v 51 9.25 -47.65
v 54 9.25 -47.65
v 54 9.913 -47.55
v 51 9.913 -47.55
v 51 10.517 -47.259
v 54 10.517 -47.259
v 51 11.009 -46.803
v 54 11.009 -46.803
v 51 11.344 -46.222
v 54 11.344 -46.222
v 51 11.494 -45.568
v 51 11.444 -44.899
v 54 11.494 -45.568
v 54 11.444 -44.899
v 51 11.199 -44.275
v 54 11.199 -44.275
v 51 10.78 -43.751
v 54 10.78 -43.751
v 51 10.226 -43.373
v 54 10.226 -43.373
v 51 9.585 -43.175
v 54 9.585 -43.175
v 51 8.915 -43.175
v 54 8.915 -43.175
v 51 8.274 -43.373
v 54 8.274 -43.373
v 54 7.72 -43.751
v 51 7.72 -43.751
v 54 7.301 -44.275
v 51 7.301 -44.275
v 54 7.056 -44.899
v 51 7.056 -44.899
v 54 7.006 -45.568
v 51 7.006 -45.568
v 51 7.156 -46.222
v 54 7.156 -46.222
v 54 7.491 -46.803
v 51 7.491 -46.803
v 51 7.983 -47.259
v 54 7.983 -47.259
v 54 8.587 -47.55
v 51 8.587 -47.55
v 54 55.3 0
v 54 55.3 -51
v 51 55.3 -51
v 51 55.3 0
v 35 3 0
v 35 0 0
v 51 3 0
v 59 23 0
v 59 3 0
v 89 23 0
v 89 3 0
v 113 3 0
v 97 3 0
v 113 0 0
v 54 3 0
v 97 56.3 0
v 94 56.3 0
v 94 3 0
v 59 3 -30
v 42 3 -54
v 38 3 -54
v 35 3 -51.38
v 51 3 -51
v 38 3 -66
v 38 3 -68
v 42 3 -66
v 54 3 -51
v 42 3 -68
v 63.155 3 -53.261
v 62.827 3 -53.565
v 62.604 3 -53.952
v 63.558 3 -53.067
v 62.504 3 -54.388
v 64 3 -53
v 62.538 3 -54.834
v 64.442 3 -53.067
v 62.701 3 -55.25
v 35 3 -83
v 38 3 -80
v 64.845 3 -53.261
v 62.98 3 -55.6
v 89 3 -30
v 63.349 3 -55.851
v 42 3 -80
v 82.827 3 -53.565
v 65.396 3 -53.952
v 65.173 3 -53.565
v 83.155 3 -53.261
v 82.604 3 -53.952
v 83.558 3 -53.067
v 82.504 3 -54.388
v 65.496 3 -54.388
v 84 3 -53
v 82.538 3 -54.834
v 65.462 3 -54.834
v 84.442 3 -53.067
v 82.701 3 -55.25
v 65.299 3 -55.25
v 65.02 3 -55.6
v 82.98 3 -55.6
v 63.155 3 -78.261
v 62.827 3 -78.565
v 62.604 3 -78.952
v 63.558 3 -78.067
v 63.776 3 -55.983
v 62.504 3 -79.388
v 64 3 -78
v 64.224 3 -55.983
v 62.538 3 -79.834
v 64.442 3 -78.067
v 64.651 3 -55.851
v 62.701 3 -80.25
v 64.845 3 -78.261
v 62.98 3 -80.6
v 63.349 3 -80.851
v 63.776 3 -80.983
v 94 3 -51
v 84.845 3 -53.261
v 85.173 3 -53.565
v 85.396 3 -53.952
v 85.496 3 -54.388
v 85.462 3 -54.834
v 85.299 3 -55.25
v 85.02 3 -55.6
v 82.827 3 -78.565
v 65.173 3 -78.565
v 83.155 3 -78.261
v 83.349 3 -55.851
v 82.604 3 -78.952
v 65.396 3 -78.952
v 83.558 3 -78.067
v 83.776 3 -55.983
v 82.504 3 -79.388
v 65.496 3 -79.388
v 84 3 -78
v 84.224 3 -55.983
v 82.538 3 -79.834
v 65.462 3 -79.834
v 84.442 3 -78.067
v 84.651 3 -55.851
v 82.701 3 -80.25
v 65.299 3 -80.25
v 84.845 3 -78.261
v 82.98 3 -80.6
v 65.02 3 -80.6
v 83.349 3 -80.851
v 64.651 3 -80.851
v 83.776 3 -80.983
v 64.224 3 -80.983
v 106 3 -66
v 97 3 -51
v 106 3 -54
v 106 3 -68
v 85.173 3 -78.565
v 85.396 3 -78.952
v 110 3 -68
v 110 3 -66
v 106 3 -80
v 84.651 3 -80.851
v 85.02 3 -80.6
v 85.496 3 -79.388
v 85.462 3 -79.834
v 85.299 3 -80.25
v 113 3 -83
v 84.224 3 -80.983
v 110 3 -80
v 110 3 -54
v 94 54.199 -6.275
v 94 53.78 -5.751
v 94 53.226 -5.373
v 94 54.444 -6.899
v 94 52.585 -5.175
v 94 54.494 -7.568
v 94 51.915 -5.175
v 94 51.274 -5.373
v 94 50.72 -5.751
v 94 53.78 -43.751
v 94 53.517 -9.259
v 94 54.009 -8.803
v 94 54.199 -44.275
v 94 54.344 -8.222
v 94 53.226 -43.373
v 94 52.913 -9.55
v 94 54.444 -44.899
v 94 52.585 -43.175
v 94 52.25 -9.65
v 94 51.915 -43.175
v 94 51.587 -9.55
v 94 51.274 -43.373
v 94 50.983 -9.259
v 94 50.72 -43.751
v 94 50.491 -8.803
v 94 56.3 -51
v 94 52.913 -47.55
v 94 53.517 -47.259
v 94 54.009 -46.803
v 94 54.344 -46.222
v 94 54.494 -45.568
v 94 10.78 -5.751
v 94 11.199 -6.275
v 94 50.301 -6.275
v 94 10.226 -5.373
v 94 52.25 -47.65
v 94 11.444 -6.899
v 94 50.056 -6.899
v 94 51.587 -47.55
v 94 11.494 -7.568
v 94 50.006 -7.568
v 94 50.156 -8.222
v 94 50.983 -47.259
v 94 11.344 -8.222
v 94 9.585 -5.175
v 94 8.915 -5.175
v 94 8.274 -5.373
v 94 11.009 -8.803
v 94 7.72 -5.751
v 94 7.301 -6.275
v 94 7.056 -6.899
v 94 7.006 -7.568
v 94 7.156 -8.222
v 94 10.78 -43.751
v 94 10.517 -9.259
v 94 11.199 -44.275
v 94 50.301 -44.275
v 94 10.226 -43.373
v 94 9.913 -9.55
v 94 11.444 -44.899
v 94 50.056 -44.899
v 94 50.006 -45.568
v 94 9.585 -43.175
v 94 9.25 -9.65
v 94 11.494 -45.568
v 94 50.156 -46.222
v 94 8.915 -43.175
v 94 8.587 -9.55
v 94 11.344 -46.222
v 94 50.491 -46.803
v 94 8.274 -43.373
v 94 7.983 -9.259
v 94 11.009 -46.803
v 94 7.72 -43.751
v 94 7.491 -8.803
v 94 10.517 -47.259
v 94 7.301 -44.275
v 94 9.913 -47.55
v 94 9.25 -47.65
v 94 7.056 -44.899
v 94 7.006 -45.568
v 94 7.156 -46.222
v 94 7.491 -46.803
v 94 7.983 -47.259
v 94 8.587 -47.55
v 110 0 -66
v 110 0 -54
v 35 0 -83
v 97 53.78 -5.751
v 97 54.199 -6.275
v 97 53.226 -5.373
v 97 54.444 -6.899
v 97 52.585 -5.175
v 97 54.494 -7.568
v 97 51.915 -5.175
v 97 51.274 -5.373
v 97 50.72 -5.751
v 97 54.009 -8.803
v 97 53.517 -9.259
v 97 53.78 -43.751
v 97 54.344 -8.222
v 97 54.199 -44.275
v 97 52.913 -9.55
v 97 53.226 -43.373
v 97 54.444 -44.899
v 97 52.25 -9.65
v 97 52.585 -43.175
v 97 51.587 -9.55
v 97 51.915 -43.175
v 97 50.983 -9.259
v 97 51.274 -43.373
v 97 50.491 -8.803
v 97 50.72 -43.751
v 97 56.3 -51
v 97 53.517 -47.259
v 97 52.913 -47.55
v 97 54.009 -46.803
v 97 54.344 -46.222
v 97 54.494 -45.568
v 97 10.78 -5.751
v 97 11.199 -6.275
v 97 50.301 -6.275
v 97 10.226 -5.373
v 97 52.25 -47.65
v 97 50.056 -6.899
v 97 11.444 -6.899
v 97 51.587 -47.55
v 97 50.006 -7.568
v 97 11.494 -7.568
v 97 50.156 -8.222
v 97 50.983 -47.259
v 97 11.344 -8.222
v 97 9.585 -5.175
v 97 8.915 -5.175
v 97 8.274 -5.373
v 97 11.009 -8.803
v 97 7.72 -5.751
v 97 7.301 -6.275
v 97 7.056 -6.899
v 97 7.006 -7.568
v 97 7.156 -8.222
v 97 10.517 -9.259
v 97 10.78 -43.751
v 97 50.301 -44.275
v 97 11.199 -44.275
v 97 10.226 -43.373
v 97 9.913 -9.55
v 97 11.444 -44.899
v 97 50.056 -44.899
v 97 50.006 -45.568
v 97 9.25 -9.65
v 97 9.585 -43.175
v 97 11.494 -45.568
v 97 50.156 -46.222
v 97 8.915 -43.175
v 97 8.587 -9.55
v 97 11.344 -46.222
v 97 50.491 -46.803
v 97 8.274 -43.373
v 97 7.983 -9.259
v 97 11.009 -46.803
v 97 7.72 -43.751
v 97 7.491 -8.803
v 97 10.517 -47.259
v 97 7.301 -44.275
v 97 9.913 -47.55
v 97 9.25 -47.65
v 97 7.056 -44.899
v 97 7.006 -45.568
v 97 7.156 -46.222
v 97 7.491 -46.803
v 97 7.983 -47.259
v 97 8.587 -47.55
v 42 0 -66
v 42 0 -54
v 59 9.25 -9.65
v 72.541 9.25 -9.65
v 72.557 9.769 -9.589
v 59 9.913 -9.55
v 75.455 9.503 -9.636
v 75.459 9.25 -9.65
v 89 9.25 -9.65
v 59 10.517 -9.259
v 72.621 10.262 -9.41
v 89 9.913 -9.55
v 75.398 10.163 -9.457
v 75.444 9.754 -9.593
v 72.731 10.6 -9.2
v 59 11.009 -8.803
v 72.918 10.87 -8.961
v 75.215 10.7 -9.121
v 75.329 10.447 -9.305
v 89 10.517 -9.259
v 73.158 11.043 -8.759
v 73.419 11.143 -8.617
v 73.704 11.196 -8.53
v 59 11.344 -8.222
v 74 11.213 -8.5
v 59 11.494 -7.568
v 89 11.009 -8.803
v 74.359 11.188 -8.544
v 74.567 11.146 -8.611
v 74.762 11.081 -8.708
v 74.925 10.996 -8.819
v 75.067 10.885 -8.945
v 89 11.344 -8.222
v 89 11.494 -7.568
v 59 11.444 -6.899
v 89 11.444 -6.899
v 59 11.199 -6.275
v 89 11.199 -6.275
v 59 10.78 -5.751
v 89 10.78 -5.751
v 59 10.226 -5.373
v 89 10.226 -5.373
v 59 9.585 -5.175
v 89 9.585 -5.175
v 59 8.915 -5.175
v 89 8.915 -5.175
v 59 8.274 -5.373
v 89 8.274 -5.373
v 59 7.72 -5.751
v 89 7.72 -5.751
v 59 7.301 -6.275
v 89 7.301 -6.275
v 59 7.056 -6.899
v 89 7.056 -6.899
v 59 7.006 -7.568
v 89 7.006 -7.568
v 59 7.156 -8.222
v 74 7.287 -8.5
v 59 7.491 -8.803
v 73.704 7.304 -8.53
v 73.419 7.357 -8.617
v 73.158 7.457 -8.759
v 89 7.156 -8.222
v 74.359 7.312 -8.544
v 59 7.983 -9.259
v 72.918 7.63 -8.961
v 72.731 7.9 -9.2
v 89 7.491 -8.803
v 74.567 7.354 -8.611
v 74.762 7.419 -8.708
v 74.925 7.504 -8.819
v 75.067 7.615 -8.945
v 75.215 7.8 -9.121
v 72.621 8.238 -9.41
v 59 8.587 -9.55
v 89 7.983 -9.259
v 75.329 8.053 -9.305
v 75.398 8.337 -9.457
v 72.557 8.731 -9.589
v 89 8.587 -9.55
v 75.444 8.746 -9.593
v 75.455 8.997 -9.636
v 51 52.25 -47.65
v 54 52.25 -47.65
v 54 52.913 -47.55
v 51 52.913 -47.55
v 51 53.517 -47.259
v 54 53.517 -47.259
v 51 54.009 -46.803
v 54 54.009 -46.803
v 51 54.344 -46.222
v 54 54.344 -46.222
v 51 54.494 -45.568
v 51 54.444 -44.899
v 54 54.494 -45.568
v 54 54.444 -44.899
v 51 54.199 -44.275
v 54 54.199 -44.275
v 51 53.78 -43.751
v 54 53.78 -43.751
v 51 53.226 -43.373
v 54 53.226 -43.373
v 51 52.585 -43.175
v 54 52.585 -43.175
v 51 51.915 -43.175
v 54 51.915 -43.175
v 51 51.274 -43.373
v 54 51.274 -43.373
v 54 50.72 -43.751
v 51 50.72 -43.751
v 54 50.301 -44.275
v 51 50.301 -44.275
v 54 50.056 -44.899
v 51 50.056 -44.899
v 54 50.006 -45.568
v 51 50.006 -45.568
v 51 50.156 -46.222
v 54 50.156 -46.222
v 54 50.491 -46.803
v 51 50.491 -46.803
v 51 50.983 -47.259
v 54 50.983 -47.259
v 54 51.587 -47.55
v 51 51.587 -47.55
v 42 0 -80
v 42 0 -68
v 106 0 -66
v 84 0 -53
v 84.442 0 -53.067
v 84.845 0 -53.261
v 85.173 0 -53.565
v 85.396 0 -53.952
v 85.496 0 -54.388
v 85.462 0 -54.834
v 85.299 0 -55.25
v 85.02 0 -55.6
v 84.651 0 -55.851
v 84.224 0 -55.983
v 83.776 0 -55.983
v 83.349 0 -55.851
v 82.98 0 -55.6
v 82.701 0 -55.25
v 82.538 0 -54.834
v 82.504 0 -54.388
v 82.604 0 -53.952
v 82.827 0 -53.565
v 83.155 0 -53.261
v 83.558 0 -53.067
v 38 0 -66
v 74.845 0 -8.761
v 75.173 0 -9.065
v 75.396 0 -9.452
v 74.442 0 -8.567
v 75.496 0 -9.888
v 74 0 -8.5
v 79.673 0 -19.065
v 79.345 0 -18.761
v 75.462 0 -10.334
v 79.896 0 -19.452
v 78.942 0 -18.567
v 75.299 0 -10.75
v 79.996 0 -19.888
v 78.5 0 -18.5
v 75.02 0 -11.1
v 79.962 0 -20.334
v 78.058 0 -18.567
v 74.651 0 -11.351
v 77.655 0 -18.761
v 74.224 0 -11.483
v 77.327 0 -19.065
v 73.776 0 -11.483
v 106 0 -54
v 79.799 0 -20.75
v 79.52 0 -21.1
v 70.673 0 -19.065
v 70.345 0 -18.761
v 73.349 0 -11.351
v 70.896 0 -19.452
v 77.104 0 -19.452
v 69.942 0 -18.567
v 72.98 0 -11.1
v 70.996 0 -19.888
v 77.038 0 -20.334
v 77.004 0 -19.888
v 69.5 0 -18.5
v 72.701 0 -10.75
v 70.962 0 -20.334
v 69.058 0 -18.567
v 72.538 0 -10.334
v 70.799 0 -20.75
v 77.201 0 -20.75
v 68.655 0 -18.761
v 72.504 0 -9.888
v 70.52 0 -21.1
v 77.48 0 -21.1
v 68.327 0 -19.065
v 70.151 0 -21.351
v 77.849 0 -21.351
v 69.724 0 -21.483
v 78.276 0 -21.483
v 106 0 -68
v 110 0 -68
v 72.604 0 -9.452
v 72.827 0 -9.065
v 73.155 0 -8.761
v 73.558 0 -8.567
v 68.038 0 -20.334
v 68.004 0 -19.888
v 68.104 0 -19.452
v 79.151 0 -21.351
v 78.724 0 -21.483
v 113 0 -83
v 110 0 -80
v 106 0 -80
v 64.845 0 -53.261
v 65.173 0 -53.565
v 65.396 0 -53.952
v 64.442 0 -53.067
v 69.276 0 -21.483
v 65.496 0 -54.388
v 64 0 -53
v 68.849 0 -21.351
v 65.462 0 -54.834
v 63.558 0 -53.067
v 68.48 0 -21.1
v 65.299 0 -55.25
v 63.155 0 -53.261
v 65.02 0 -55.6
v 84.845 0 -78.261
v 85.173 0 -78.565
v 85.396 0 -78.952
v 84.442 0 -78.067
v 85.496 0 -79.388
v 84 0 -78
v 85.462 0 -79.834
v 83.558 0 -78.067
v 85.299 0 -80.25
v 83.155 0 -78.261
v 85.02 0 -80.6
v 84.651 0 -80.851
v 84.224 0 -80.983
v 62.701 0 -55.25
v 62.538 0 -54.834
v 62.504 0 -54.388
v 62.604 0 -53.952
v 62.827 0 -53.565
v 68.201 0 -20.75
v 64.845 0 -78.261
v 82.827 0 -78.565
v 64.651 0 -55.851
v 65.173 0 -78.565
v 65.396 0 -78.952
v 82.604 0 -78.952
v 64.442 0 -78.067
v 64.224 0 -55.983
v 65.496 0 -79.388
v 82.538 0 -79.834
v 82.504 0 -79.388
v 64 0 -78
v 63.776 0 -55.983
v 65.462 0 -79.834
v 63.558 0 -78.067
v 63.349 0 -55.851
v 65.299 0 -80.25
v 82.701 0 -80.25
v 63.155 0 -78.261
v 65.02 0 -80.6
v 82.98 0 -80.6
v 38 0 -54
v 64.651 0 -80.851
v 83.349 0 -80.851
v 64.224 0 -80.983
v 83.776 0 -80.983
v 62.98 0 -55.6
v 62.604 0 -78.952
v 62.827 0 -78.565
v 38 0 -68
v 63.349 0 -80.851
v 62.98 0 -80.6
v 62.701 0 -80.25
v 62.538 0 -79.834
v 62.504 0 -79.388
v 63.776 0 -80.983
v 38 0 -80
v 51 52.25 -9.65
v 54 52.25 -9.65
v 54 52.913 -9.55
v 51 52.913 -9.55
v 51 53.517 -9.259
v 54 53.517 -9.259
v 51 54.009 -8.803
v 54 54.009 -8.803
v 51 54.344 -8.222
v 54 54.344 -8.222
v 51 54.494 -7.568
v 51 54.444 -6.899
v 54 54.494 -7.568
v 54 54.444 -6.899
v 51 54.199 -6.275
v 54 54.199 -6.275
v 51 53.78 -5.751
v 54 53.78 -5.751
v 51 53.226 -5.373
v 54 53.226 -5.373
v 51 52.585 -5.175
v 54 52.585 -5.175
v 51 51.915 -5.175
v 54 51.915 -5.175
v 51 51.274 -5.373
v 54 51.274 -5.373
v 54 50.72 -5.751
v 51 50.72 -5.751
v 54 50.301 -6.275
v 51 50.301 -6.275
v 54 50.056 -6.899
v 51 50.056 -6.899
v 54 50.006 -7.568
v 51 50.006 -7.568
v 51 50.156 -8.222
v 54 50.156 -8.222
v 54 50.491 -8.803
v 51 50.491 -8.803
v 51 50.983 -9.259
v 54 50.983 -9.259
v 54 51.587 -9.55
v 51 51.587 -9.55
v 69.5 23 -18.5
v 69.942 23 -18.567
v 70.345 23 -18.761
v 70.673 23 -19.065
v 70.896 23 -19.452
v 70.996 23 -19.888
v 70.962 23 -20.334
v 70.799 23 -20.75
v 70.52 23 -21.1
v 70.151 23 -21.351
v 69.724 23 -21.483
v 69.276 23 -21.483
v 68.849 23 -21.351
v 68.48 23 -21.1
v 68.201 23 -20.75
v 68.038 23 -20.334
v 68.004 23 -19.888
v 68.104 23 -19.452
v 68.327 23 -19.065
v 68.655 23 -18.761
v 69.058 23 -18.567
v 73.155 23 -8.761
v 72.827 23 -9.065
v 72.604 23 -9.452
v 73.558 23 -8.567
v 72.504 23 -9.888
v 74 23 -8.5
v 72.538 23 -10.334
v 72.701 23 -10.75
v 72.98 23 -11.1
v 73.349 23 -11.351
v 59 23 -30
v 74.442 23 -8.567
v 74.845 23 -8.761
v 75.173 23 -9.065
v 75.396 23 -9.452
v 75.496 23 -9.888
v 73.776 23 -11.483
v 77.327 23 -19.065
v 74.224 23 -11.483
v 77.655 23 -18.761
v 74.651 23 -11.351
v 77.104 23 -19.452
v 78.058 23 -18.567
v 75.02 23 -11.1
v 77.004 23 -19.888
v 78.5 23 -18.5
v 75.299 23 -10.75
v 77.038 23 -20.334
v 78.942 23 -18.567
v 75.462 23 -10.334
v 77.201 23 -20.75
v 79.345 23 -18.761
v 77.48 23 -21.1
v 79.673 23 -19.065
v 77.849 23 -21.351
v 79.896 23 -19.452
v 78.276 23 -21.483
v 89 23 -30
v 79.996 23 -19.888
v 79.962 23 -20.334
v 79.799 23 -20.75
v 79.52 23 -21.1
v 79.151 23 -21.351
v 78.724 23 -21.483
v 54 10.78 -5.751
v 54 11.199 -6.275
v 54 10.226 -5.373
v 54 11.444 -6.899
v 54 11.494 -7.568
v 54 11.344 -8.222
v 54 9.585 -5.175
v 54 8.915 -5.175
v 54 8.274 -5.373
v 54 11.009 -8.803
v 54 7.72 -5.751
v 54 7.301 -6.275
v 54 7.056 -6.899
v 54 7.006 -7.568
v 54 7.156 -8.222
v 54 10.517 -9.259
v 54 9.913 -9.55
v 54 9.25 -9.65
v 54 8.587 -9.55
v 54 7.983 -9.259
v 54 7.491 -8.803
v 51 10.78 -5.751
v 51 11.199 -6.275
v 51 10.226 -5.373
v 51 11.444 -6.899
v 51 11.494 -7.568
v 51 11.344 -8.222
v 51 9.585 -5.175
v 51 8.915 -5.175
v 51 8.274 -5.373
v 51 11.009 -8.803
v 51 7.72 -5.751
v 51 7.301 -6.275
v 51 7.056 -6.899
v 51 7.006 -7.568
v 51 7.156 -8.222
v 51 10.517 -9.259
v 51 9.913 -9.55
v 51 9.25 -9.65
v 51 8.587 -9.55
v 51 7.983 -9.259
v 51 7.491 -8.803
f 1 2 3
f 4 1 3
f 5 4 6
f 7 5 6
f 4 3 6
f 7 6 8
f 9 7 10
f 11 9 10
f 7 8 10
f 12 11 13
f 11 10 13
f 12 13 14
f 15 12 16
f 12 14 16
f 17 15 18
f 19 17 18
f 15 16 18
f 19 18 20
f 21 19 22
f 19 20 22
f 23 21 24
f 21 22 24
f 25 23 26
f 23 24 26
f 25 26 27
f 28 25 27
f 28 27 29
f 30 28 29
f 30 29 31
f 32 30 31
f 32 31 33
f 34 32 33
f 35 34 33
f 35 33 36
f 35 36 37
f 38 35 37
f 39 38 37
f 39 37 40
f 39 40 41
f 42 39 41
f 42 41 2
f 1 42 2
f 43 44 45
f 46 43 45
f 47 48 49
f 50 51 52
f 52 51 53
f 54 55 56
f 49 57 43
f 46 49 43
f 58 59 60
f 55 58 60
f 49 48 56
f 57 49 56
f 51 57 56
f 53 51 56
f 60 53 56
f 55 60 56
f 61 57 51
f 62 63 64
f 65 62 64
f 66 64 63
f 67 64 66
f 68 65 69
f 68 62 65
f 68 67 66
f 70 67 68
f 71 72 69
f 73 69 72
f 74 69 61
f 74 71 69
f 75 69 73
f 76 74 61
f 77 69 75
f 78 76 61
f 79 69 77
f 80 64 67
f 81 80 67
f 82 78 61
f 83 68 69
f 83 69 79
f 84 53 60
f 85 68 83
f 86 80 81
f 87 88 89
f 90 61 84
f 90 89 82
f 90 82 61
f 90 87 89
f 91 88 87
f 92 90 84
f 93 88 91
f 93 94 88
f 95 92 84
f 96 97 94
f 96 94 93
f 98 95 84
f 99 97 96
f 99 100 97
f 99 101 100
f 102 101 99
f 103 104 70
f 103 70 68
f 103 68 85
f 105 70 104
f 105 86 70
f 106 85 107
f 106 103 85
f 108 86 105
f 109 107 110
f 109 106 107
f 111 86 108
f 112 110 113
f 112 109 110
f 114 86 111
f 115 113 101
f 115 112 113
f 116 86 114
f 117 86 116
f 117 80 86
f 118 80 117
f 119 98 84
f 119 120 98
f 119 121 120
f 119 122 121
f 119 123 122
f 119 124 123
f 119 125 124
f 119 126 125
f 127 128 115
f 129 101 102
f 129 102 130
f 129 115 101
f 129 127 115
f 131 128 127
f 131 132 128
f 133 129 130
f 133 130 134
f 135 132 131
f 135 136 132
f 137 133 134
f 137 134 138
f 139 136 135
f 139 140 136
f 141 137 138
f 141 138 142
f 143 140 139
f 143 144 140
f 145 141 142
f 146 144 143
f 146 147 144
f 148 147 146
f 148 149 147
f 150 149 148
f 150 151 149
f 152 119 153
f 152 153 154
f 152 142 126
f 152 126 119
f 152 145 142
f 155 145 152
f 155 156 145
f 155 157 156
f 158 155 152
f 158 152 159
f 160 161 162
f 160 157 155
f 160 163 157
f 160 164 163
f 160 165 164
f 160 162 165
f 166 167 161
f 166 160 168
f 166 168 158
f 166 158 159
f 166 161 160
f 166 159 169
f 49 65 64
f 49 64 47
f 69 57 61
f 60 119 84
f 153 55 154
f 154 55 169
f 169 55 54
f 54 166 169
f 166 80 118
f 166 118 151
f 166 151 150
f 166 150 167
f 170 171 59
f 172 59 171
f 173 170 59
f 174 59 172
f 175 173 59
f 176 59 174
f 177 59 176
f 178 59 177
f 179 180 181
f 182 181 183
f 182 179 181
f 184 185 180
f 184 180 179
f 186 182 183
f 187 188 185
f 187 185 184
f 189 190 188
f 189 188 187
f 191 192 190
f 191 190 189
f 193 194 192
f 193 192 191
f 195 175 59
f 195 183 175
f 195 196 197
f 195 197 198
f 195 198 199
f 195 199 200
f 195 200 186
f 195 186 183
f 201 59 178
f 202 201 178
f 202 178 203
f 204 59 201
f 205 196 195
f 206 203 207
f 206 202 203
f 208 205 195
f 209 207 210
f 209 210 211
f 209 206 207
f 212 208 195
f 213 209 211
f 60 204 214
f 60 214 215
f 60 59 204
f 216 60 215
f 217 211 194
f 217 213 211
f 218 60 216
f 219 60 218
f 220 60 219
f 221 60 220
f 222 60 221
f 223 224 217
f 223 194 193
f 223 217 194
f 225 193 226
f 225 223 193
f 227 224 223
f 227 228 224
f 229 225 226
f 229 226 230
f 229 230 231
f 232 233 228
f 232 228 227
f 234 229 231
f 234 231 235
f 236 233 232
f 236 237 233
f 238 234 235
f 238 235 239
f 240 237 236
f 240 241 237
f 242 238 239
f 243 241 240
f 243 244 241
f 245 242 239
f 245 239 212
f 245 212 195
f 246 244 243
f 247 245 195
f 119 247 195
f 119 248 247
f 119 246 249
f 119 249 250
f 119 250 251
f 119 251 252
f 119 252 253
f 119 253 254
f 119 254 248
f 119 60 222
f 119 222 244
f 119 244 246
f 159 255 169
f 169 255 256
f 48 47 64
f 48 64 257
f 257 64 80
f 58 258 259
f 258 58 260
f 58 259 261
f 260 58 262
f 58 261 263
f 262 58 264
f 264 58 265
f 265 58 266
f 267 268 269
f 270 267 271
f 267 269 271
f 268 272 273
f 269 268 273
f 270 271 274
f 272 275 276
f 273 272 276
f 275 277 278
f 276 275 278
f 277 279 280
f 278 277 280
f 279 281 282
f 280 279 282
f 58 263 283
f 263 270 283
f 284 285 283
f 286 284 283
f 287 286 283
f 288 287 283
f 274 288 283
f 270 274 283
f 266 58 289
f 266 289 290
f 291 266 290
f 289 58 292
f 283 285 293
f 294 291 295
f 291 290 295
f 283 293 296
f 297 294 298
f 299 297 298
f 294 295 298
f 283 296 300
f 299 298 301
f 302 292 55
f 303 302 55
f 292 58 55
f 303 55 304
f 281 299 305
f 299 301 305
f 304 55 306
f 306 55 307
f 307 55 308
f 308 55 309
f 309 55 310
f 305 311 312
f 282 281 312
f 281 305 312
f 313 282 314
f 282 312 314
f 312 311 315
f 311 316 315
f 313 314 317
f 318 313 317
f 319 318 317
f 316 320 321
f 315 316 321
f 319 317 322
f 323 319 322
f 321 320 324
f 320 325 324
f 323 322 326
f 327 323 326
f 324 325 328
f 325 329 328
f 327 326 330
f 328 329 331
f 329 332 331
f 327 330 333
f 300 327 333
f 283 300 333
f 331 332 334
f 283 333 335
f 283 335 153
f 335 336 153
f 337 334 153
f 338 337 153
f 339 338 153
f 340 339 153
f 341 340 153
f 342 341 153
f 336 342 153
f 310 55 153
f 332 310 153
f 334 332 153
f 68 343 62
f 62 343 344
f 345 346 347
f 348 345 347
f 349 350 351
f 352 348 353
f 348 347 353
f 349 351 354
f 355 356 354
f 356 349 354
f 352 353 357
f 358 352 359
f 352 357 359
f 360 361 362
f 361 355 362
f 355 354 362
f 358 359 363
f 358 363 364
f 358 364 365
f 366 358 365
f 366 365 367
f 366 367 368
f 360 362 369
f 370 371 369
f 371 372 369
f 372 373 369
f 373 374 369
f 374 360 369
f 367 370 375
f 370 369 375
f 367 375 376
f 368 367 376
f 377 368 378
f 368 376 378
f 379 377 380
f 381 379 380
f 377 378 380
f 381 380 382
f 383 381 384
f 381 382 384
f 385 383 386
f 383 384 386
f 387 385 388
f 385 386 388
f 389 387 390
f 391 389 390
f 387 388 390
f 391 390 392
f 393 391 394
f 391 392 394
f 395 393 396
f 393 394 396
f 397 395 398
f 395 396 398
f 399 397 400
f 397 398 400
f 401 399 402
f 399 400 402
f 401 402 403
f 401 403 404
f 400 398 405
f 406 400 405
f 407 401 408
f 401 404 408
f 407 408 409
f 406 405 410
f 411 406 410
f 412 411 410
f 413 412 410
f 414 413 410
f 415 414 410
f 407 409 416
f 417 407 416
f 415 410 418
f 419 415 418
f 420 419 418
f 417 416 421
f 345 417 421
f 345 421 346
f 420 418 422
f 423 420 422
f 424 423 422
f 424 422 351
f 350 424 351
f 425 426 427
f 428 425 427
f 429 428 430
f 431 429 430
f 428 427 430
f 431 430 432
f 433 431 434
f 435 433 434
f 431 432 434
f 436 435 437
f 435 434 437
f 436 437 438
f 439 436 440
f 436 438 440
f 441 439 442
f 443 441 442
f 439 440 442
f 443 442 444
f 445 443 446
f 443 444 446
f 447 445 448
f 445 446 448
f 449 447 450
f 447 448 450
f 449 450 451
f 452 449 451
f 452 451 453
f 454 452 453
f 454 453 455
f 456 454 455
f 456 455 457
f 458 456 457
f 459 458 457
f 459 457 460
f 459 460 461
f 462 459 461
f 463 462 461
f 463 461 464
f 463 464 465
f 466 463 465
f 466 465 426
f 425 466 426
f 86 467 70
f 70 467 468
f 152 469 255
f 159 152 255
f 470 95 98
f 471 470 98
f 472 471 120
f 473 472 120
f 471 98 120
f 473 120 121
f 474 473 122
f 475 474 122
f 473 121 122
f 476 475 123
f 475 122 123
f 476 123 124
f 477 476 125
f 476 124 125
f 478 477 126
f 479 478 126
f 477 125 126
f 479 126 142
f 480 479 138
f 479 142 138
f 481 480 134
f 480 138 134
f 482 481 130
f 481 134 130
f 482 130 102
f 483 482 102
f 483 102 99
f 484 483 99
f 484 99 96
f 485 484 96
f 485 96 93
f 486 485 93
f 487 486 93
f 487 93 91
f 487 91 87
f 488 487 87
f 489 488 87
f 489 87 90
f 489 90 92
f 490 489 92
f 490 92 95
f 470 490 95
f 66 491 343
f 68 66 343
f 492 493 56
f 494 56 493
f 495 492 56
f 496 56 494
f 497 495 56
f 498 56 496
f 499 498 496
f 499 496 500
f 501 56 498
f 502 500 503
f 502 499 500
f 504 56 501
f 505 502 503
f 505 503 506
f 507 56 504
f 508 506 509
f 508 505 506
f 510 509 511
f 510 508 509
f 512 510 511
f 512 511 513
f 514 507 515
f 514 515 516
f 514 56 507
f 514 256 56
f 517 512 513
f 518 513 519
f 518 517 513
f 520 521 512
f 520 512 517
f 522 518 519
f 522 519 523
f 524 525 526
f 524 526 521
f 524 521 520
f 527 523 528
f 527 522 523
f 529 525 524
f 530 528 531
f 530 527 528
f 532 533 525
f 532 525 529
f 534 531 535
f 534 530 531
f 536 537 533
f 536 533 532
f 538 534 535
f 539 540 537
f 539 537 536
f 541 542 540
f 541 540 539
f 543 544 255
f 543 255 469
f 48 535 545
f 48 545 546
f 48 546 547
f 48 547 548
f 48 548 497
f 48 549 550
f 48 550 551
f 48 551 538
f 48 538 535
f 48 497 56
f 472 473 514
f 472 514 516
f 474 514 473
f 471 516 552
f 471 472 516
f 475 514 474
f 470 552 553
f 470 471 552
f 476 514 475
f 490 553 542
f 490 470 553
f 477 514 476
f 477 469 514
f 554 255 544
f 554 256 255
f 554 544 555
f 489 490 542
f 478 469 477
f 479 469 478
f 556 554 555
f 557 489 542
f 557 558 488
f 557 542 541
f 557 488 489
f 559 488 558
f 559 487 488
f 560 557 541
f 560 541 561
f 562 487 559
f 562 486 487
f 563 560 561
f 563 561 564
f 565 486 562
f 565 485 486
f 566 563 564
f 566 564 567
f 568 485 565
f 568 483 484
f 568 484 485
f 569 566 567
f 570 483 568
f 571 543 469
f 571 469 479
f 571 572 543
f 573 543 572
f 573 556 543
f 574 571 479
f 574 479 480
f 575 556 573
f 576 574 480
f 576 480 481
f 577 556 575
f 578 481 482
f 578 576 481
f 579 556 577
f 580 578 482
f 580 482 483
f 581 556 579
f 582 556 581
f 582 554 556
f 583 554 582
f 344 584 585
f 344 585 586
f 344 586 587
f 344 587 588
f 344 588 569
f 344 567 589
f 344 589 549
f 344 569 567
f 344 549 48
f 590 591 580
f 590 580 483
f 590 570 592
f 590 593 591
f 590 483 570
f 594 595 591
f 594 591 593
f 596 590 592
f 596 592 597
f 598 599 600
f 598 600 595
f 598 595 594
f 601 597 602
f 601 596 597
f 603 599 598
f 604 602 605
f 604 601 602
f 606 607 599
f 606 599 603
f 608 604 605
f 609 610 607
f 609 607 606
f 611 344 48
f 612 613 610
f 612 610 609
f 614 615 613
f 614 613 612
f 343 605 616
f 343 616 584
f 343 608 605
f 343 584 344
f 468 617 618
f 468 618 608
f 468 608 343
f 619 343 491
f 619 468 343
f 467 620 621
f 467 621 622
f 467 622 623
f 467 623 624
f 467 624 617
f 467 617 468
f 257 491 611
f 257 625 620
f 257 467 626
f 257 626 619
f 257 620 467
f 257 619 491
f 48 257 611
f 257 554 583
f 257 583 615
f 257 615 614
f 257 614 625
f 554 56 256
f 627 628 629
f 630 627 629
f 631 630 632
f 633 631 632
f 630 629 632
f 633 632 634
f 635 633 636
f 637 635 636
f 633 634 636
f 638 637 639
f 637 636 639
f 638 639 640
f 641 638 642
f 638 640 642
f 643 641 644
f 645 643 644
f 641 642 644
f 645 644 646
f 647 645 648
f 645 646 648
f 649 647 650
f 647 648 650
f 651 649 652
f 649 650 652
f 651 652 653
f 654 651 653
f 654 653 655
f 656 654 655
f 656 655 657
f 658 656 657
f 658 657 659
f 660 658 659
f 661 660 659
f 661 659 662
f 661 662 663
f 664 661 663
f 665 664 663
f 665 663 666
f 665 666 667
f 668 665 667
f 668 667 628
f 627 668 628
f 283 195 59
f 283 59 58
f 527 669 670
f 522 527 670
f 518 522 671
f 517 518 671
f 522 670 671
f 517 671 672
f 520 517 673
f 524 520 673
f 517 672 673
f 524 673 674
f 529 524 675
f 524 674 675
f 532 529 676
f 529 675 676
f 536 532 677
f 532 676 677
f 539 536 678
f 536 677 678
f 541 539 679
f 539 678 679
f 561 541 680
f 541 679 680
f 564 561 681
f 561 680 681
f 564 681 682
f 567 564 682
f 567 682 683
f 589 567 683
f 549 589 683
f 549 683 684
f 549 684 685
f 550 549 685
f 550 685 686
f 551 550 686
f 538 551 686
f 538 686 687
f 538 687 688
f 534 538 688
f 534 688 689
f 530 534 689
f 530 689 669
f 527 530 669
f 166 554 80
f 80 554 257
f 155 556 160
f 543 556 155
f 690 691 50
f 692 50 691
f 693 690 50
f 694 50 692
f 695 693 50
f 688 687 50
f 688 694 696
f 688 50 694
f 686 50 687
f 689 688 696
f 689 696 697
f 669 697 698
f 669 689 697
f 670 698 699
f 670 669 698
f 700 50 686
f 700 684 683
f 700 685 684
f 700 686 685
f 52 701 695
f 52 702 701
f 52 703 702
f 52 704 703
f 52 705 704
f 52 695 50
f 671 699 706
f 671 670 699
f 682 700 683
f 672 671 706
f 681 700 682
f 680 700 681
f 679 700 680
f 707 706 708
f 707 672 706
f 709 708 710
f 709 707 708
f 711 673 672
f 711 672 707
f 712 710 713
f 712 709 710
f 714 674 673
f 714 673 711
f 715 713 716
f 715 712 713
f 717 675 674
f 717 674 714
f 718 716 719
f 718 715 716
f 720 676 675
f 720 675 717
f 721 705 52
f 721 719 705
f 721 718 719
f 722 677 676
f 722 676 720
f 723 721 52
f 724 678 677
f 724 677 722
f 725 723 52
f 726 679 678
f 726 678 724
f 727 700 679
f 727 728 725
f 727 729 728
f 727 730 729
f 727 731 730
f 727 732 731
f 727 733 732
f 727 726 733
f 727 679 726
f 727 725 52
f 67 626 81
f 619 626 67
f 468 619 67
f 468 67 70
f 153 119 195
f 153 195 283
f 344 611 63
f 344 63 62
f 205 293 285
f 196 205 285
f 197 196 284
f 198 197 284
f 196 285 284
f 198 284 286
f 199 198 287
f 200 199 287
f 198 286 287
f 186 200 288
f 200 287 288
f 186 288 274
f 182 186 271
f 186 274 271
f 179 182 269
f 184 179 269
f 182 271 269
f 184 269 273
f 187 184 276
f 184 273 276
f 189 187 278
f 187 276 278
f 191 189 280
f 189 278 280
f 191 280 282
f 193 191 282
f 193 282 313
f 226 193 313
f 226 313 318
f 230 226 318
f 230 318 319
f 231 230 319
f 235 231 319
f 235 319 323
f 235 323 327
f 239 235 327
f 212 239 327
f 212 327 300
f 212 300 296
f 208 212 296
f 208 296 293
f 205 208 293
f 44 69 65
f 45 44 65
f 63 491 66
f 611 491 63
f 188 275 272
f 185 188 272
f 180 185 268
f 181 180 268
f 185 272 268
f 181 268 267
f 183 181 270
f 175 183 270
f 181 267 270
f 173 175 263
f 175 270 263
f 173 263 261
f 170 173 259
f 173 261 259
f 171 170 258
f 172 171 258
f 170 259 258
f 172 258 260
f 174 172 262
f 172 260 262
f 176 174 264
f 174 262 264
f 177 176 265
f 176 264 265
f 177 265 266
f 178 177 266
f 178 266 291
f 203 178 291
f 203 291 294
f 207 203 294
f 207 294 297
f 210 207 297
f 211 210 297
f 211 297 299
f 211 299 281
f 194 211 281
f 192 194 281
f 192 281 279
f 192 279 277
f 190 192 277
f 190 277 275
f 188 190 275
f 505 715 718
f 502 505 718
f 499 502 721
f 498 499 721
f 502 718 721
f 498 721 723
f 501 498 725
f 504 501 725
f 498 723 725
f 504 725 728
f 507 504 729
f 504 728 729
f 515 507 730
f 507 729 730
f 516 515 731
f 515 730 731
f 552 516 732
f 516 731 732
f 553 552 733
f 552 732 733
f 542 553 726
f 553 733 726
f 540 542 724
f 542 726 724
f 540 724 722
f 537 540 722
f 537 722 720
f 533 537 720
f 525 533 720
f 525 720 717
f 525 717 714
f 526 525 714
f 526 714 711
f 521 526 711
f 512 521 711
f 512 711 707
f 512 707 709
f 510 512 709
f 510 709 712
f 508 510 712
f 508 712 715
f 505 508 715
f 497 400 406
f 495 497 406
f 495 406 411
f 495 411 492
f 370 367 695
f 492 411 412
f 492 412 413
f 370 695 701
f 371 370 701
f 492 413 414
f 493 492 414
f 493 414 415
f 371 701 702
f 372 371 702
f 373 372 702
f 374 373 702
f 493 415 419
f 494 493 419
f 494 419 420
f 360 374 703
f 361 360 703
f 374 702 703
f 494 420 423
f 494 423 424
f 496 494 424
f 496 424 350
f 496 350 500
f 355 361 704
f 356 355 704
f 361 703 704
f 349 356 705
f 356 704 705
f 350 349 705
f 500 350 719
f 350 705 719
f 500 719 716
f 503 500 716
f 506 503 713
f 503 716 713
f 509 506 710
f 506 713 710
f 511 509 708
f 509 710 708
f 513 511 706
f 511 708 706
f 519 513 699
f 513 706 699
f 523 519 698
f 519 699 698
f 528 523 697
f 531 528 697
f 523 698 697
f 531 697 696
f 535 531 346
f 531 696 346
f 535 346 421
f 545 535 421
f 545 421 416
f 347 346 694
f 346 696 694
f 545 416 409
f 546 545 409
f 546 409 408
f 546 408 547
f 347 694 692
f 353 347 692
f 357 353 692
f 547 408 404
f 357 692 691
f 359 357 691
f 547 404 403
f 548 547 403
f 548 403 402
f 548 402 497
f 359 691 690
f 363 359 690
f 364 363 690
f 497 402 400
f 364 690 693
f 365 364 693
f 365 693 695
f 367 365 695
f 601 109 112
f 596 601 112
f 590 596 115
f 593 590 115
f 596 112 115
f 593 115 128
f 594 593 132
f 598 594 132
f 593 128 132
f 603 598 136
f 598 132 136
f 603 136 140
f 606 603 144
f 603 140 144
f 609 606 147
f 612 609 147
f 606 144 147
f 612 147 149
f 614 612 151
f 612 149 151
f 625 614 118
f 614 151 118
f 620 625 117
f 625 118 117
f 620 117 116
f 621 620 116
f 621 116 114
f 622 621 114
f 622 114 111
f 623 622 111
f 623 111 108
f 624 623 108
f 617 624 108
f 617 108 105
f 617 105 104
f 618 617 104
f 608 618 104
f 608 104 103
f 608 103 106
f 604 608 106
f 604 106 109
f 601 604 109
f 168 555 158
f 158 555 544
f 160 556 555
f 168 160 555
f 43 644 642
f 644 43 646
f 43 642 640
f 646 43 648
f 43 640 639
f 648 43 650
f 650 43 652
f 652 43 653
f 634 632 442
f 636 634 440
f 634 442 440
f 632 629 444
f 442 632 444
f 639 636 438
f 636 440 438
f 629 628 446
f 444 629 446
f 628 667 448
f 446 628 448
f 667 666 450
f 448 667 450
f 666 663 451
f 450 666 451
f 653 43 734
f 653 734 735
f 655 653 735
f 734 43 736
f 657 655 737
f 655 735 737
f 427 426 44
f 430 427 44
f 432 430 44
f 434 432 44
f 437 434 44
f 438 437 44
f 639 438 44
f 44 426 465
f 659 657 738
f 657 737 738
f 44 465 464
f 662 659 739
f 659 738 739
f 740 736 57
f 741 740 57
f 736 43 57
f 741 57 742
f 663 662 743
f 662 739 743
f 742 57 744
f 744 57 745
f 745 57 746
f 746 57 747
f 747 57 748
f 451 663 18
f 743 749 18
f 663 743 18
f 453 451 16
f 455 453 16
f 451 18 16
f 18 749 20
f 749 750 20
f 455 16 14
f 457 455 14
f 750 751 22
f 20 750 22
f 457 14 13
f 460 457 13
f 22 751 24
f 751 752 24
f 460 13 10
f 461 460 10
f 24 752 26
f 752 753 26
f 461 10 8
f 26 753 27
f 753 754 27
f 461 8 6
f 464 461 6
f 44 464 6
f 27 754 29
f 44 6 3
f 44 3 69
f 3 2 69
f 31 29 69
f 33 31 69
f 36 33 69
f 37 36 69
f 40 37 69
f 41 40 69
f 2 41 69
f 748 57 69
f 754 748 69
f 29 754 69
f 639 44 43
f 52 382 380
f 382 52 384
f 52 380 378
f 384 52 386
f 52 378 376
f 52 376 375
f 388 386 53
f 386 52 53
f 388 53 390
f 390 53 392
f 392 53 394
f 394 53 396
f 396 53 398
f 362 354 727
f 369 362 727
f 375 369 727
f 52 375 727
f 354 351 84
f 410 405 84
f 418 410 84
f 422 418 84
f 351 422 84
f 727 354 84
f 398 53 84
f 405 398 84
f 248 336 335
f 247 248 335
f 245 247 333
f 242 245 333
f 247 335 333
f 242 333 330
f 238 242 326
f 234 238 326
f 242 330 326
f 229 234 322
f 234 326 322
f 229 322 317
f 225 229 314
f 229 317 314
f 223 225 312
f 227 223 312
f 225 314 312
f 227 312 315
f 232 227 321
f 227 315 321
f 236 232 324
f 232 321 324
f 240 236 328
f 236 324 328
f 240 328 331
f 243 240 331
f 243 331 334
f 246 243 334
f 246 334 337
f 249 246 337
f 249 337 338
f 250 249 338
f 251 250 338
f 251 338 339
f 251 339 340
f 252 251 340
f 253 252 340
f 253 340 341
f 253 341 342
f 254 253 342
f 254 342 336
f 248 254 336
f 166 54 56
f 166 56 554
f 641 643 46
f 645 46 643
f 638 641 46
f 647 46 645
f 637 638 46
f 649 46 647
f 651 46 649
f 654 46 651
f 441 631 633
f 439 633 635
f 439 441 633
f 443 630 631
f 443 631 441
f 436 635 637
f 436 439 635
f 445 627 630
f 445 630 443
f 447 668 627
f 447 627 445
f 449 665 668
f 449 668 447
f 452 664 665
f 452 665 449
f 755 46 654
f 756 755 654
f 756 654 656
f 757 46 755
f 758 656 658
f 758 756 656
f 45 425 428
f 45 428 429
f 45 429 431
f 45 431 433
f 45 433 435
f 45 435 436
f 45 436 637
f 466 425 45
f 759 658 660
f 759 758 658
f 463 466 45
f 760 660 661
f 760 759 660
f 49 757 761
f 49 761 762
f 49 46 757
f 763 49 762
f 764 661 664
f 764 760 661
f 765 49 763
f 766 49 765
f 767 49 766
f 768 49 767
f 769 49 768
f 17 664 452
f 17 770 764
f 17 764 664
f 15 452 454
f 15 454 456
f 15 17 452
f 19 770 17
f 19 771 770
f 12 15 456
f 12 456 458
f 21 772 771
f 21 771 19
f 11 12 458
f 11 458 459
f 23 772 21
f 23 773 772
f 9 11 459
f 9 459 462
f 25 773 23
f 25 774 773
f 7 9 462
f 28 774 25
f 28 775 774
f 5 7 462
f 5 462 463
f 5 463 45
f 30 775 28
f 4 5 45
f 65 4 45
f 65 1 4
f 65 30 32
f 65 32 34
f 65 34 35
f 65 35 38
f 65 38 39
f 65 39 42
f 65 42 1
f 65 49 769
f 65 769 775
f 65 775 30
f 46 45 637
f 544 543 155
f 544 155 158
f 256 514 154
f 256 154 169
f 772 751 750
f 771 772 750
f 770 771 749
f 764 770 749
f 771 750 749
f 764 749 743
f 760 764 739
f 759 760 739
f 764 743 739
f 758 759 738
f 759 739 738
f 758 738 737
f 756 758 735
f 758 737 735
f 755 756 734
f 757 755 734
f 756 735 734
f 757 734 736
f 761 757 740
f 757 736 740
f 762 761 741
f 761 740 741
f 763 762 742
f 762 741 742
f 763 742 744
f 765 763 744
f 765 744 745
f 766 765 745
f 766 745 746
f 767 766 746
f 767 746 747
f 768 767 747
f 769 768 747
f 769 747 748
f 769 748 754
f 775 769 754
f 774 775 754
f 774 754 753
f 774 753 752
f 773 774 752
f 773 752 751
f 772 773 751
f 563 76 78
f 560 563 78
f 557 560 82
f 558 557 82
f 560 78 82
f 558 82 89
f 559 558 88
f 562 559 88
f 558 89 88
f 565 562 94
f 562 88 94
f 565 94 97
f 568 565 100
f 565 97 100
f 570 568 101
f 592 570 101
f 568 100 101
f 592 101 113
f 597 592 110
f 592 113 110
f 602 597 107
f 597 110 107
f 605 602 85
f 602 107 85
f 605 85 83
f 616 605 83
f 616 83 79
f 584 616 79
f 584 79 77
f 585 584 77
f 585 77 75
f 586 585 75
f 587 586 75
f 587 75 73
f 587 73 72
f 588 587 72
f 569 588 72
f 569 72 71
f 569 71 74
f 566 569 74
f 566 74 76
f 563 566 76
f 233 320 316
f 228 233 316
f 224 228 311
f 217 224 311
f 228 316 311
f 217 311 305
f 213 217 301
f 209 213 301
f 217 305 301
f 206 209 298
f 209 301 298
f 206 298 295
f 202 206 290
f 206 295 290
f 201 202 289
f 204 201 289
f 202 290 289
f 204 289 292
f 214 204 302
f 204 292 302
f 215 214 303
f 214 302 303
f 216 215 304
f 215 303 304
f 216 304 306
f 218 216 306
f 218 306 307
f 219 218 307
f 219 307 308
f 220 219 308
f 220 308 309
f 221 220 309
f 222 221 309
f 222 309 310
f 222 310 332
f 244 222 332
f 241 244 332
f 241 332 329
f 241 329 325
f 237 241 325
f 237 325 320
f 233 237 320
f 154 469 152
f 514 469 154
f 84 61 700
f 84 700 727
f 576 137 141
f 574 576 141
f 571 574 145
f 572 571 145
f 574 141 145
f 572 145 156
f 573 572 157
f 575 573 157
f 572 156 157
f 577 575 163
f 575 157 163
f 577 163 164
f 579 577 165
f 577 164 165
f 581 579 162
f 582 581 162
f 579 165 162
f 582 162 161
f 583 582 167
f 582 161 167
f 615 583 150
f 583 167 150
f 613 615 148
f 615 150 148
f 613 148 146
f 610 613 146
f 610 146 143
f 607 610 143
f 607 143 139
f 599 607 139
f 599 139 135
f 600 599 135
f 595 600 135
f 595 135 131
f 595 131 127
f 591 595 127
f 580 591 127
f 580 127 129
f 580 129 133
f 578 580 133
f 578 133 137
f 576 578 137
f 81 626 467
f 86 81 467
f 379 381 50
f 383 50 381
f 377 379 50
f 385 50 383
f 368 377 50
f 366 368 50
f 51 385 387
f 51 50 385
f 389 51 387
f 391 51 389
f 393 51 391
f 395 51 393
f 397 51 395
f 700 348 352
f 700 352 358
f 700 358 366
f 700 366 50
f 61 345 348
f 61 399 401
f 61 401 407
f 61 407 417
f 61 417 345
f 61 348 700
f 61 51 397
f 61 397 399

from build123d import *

# Parameters (mm, degrees)
SKETCH1_W            = 148
SKETCH1_H            = 115
BOSS_EXTRUDE4_DEPTH  = 3
SKETCH2_R            = 2.25
CUT_EXTRUDE1_DEPTH   = 3
SKETCH3_R            = 2.25
CUT_EXTRUDE2_DEPTH   = 3
SKETCH4_R            = 2.25
CUT_EXTRUDE3_DEPTH   = 3
SKETCH5_W            = 30
SKETCH5_H            = 30
BOSS_EXTRUDE7_DEPTH  = 20
SKETCH6_R            = 2.25
CUT_EXTRUDE4_DEPTH   = 10
SKETCH7_R            = 1.5
CUT_EXTRUDE5_DEPTH   = 30
SKETCH10_W           = 20
SKETCH10_H           = 51.38
CUT_EXTRUDE6_DEPTH   = 51.3
SKETCH11_W           = 20.353734706
SKETCH11_H           = 51.38
CUT_EXTRUDE7_DEPTH   = 51.3
SKETCH13_W           = 5
SKETCH13_H           = 14
CUT_EXTRUDE8_DEPTH   = 51.3
SKETCH8_W            = 3
SKETCH8_H            = 51
BOSS_EXTRUDE11_DEPTH = 53.3
SKETCH9_W            = 3
SKETCH9_H            = 51
BOSS_EXTRUDE12_DEPTH = 55.3
SKETCH15_R           = 2.25
CUT_EXTRUDE12_DEPTH  = 53.3
SKETCH14_R           = 2.25
CUT_EXTRUDE13_DEPTH  = 53.3
SKETCH17_R           = 2.25
CUT_EXTRUDE14_DEPTH  = 53.3
SKETCH18_W           = 15
SKETCH18_H           = 51.38
CUT_EXTRUDE15_DEPTH  = 10
SKETCH19_W           = 145.001760506
SKETCH19_H           = 61.096648556
BOSS_EXTRUDE13_DEPTH = 3
SKETCH20_R           = 1.5
CUT_EXTRUDE16_DEPTH  = 43
SKETCH21_W           = 109.74816289
SKETCH21_H           = 51.975747058
CUT_EXTRUDE18_DEPTH  = 43
SKETCH23_W           = 39.73104878
SKETCH23_H           = 68.636927329
CUT_EXTRUDE19_DEPTH  = 43
SKETCH24_W           = 37.931057655
SKETCH24_H           = 65.519761518
CUT_EXTRUDE20_DEPTH  = 43
SKETCH25_W           = 4
SKETCH25_H           = 12
CUT_EXTRUDE23_DEPTH  = 43


with BuildPart() as part:
    # Sketch1 → Boss-Extrude4 (new body)
    with BuildSketch(Plane(origin=(0, 0, 0), x_dir=(1, 0, 0), z_dir=(0, 1, 0))):
        with Locations((74, 57.5)):
            Rectangle(SKETCH1_W, SKETCH1_H)
    extrude(amount=BOSS_EXTRUDE4_DEPTH)

    # Sketch2 → Cut-Extrude1 (cut)
    with BuildSketch(Plane(origin=(0, 3, 0), x_dir=(1, 0, 0), z_dir=(0, 1, 0))):
        with Locations(Location((5, 110, 0), (0, 0, 270))):
            Circle(SKETCH2_R)
    extrude(amount=-CUT_EXTRUDE1_DEPTH, mode=Mode.SUBTRACT)

    # Sketch3 → Cut-Extrude2 (cut)
    with BuildSketch(Plane(origin=(0, 3, 0), x_dir=(1, 0, 0), z_dir=(0, 1, 0))):
        with Locations(Location((143, 110, 0), (0, 0, 270))):
            Circle(SKETCH3_R)
    extrude(amount=-CUT_EXTRUDE2_DEPTH, mode=Mode.SUBTRACT)

    # Sketch4 → Cut-Extrude3 (cut)
    with BuildSketch(Plane(origin=(0, 3, 0), x_dir=(1, 0, 0), z_dir=(0, 1, 0))):
        with Locations(Location((5, 56, 0), (0, 0, 270))):
            Circle(SKETCH4_R)
    extrude(amount=-CUT_EXTRUDE3_DEPTH, mode=Mode.SUBTRACT)

    # Sketch5 → Boss-Extrude7 (add)
    with BuildSketch(Plane(origin=(0, 3, 0), x_dir=(1, 0, 0), z_dir=(0, 1, 0))):
        with Locations((74, 15)):
            Rectangle(SKETCH5_W, SKETCH5_H)
    extrude(amount=BOSS_EXTRUDE7_DEPTH)

    # Sketch6 → Cut-Extrude4 (cut)
    with BuildSketch(Plane(origin=(0, 3, 0), x_dir=(1, 0, 0), z_dir=(0, 1, 0))):
        with Locations(Location((20, 110, 0), (0, 0, 270))):
            Circle(SKETCH6_R)
        with Locations(Location((35, 110, 0), (0, 0, 270))):
            Circle(SKETCH6_R)
        with Locations(Location((20, 56, 0), (0, 0, 270))):
            Circle(SKETCH6_R)
        with Locations(Location((35, 56, 0), (0, 0, 270))):
            Circle(SKETCH6_R)
        with Locations(Location((128, 110, 0), (0, 0, 270))):
            Circle(SKETCH6_R)
        with Locations(Location((113, 110, 0), (0, 0, 270))):
            Circle(SKETCH6_R)
        with Locations(Location((113, 56, 0), (0, 0, 270))):
            Circle(SKETCH6_R)
        with Locations(Location((128, 56, 0), (0, 0, 270))):
            Circle(SKETCH6_R)
        with Locations(Location((143, 56, 0), (0, 0, 270))):
            Circle(SKETCH6_R)
    extrude(amount=-CUT_EXTRUDE4_DEPTH, mode=Mode.SUBTRACT)

    # Sketch7 → Cut-Extrude5 (cut)
    with BuildSketch(Plane(origin=(0, 23, 0), x_dir=(1, 0, 0), z_dir=(0, 1, 0))):
        with Locations(Location((69.5, 20, 0), (0, 0, 270))):
            Circle(SKETCH7_R)
        with Locations(Location((74, 10, 0), (0, 0, 270))):
            Circle(SKETCH7_R)
        with Locations(Location((78.5, 20, 0), (0, 0, 270))):
            Circle(SKETCH7_R)
    extrude(amount=-CUT_EXTRUDE5_DEPTH, mode=Mode.SUBTRACT)

    # Sketch10 → Cut-Extrude6 (cut)
    with BuildSketch(Plane(origin=(0, 3, 0), x_dir=(1, 0, 0), z_dir=(0, 1, 0))):
        with Locations((138, 25.69)):
            Rectangle(SKETCH10_W, SKETCH10_H)
    extrude(amount=-CUT_EXTRUDE6_DEPTH, mode=Mode.SUBTRACT)

    # Sketch11 → Cut-Extrude7 (cut)
    with BuildSketch(Plane(origin=(0, 3, 0), x_dir=(1, 0, 0), z_dir=(0, 1, 0))):
        with Locations((9.823132647, 25.69)):
            Rectangle(SKETCH11_W, SKETCH11_H)
    extrude(amount=-CUT_EXTRUDE7_DEPTH, mode=Mode.SUBTRACT)

    # Sketch13 → Cut-Extrude8 (cut)
    with BuildSketch(Plane(origin=(0, 3, 0), x_dir=(1, 0, 0), z_dir=(0, 1, 0))):
        with Locations((27.5, 39)):
            Rectangle(SKETCH13_W, SKETCH13_H)
        with Locations((27.5, 23)):
            Rectangle(SKETCH13_W, SKETCH13_H)
        with Locations((120.5, 39)):
            Rectangle(SKETCH13_W, SKETCH13_H)
        with Locations((120.5, 23)):
            Rectangle(SKETCH13_W, SKETCH13_H)
    extrude(amount=-CUT_EXTRUDE8_DEPTH, mode=Mode.SUBTRACT)

    # Sketch8 → Boss-Extrude11 (add)
    with BuildSketch(Plane(origin=(0, 3, 0), x_dir=(1, 0, 0), z_dir=(0, 1, 0))):
        with Locations((95.5, 25.5)):
            Rectangle(SKETCH8_W, SKETCH8_H)
    extrude(amount=BOSS_EXTRUDE11_DEPTH)

    # Sketch9 → Boss-Extrude12 (add)
    with BuildSketch(Plane(origin=(0, 0, 0), x_dir=(-1, 0, 0), z_dir=(0, -1, 0))):
        with Locations((-52.5, 25.5)):
            Rectangle(SKETCH9_W, SKETCH9_H)
    extrude(amount=-BOSS_EXTRUDE12_DEPTH)

    # Sketch15 → Cut-Extrude12 (cut)
    with BuildSketch(Plane(origin=(97, 0, 0), x_dir=(0, 0, -1), z_dir=(1, 0, 0))):
        with Locations((45.4, 9.25)):
            Circle(SKETCH15_R)
    extrude(amount=-CUT_EXTRUDE12_DEPTH, mode=Mode.SUBTRACT)

    # Sketch14 → Cut-Extrude13 (cut)
    with BuildSketch(Plane(origin=(97, 0, 0), x_dir=(0, 0, -1), z_dir=(1, 0, 0))):
        with Locations((45.4, 52.25)):
            Circle(SKETCH14_R)
        with Locations((7.4, 9.25)):
            Circle(SKETCH14_R)
    extrude(amount=-CUT_EXTRUDE13_DEPTH, mode=Mode.SUBTRACT)

    # Sketch17 → Cut-Extrude14 (cut)
    with BuildSketch(Plane(origin=(97, 0, 0), x_dir=(0, 0, -1), z_dir=(1, 0, 0))):
        with Locations((7.4, 52.25)):
            Circle(SKETCH17_R)
    extrude(amount=-CUT_EXTRUDE14_DEPTH, mode=Mode.SUBTRACT)

    # Sketch18 → Cut-Extrude15 (cut)
    with BuildSketch(Plane(origin=(0, 3, 0), x_dir=(1, 0, 0), z_dir=(0, 1, 0))):
        with Locations((120.5, 25.69)):
            Rectangle(SKETCH18_W, SKETCH18_H)
        with Locations((27.5, 25.69)):
            Rectangle(SKETCH18_W, SKETCH18_H)
    extrude(amount=-CUT_EXTRUDE15_DEPTH, mode=Mode.SUBTRACT)

    # Sketch19 → Boss-Extrude13 (add)
    with BuildSketch(Plane(origin=(0, 3, 0), x_dir=(1, 0, 0), z_dir=(0, 1, 0))):
        with Locations((74.214102408, 83.006974137)):
            Rectangle(SKETCH19_W, SKETCH19_H)
    extrude(amount=-BOSS_EXTRUDE13_DEPTH)

    # Sketch20 → Cut-Extrude16 (cut)
    with BuildSketch(Plane(origin=(0, 3, 0), x_dir=(1, 0, 0), z_dir=(0, 1, 0))):
        with Locations(Location((64, 79.5, 0), (0, 0, 270))):
            Circle(SKETCH20_R)
        with Locations(Location((84, 79.5, 0), (0, 0, 270))):
            Circle(SKETCH20_R)
        with Locations(Location((64, 54.5, 0), (0, 0, 270))):
            Circle(SKETCH20_R)
        with Locations(Location((84, 54.5, 0), (0, 0, 270))):
            Circle(SKETCH20_R)
    extrude(amount=-CUT_EXTRUDE16_DEPTH, mode=Mode.SUBTRACT)

    # Sketch21 → Cut-Extrude18 (cut)
    with BuildSketch(Plane(origin=(0, 0, 0), x_dir=(-1, 0, 0), z_dir=(0, -1, 0))):
        with Locations((-79.874081445, 108.987873529)):
            Rectangle(SKETCH21_W, SKETCH21_H)
    extrude(amount=-CUT_EXTRUDE18_DEPTH, mode=Mode.SUBTRACT)

    # Sketch23 → Cut-Extrude19 (cut)
    with BuildSketch(Plane.XZ):
        with Locations((132.86552439, -85.698463665)):
            Rectangle(SKETCH23_W, SKETCH23_H)
    extrude(amount=-CUT_EXTRUDE19_DEPTH, mode=Mode.SUBTRACT)

    # Sketch24 → Cut-Extrude20 (cut)
    with BuildSketch(Plane(origin=(0, 0, 0), x_dir=(-1, 0, 0), z_dir=(0, -1, 0))):
        with Locations((-16.034471172, 84.139880759)):
            Rectangle(SKETCH24_W, SKETCH24_H)
    extrude(amount=-CUT_EXTRUDE20_DEPTH, mode=Mode.SUBTRACT)

    # Sketch25 → Cut-Extrude23 (cut)
    with BuildSketch(Plane.XZ):
        with Locations((40, -74)):
            Rectangle(SKETCH25_W, SKETCH25_H)
        with Locations((40, -60)):
            Rectangle(SKETCH25_W, SKETCH25_H)
        with Locations((108, -74)):
            Rectangle(SKETCH25_W, SKETCH25_H)
        with Locations((108, -60)):
            Rectangle(SKETCH25_W, SKETCH25_H)
    extrude(amount=-CUT_EXTRUDE23_DEPTH, mode=Mode.SUBTRACT)


solid = part.part
